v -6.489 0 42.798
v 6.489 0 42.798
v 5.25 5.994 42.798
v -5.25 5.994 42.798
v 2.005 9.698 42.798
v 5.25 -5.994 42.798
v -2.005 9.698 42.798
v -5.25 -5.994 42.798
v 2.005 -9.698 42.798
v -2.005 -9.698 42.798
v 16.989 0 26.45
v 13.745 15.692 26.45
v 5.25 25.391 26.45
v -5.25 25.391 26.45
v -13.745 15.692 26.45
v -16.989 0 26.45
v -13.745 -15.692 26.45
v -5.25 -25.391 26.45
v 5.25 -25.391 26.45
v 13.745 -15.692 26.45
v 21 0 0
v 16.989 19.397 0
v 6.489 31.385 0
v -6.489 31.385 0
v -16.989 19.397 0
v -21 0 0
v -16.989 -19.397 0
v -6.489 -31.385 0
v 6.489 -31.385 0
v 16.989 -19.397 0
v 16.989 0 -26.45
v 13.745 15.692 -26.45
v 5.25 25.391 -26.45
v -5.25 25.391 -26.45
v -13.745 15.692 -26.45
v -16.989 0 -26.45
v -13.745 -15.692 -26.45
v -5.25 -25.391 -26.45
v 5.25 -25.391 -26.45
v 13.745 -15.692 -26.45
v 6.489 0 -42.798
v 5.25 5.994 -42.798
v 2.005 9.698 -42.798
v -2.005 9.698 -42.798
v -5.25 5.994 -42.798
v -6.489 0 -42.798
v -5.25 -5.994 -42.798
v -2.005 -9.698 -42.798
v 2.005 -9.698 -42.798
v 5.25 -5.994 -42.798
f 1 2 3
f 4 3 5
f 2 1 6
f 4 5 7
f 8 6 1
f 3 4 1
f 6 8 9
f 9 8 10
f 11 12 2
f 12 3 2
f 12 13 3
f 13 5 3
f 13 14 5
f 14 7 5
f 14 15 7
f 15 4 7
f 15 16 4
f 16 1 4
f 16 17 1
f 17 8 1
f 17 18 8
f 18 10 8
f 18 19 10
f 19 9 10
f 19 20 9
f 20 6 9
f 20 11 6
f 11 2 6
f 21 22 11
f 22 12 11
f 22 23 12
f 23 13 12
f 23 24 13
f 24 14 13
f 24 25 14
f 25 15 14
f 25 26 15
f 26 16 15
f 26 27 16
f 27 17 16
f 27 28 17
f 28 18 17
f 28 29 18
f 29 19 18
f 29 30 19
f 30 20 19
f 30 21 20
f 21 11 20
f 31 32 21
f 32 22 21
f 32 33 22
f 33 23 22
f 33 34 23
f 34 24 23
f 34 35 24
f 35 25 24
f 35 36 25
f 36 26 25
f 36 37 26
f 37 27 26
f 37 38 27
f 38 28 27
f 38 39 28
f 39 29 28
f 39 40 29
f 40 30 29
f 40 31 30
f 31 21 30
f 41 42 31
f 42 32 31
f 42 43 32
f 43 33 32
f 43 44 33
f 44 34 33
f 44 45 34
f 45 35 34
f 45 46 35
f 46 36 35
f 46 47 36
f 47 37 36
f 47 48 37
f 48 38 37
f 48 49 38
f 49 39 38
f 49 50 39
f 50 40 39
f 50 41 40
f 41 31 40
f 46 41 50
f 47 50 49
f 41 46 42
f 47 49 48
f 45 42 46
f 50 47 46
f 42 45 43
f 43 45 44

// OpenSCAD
// Generated by SolidPython 1.0.1 on 2020-07-29 00:46:47


scale(v = [7, 11, 15]) {
	sphere(r = 3);
}
/***********************************************
*********      SolidPython code:      **********
************************************************
 
# import packages: SolidPython
from solid import *
from solid.utils import *
from itertools import chain, combinations, permutations


class Resize:

    def __init__(self, scad_file):
        self.scad_file = scad_file
        #self.scad_file = import_scad(scad_file)
        # cone/cylinder param:
        self.r1 = 0
        self.r2 = 0
        self.h = 0
        # rectangular prism param:
        self.w = 0
        self.l = 0
        # ellipse param:
        self.r = 0

    # import OpenScad code (file name corresponds to shape)


    # classify shape + parameters
    def assign(self, param1, param2, param3):
        if self.scad_file == 'cone.scad':
            self.r1 = param1
            self.r2 = param2
            self.h = param3
        elif self.scad_file == 'cylinder.scad':
            self.r1 = param1
            self.r2 = param2
            self.h = param3
        elif self.scad_file == 'rectangularPrism.scad':
            self.h = param1
            self.l = param2
            self.w = param3
        else:
            self.r = param1
            self.h = param2

    # resize parameters
    def iterate(self):
        x = range(3, 20, 2)
        i = 1
        if self.scad_file == 'cone.scad':
            tempList = list(permutations(x, 2))
            for temp in tempList:
                param1 = temp[0]
                param2 = temp[1]
                filepath = 'produced_scad_files/' + 'cone' + str(param1) + '_' + str(param2) + '_' + '.scad'
                scad_render_to_file(cylinder(h=param1, r1=param2, r2=0), filepath)

        elif self.scad_file == 'cylinder.scad':
            tempList = list(permutations(x, 3))
            for temp in tempList:
                param1 = temp[0]
                param2 = temp[1]
                filepath = 'produced_scad_files/' + 'cylinder' + str(param1) + '_' + str(param2) + '_' + '.scad'
                scad_render_to_file(cylinder(h=param1, r1=param2, r2=param2), filepath)

        elif self.scad_file == 'rectangularPrism.scad':
            tempList = list(permutations(x, 3))
            for temp in tempList:
                param1 = temp[0]
                param2 = temp[1]
                param3 = temp[2]
                filepath = 'produced_scad_files/' + 'rectangularPrism' + str(param1) + '_' + str(param2) + '_' + str(
                    param3) + '.scad'
                scad_render_to_file(cube(size=(param1, param2, param3)), filepath)

        elif self.scad_file == 'ellipse.scad':
            tempList = list(permutations(x, 4))
            for temp in tempList:
                param1 = temp[0]
                param2 = temp[1]
                param3 = temp[2]
                param4 = temp[3]
                filepath = 'produced_scad_files/' + 'ellipse' + str(param1) + '_' + str(param2) + '_' + str(param3) + '_' + str(param4) + '.scad'
                scad_render_to_file(scale([param1, param2, param3])(sphere(r=param4)), filepath)

    def render_to_scadfile(self):
        scad_render_to_file(scad, 'example.scad') 
 
************************************************/
